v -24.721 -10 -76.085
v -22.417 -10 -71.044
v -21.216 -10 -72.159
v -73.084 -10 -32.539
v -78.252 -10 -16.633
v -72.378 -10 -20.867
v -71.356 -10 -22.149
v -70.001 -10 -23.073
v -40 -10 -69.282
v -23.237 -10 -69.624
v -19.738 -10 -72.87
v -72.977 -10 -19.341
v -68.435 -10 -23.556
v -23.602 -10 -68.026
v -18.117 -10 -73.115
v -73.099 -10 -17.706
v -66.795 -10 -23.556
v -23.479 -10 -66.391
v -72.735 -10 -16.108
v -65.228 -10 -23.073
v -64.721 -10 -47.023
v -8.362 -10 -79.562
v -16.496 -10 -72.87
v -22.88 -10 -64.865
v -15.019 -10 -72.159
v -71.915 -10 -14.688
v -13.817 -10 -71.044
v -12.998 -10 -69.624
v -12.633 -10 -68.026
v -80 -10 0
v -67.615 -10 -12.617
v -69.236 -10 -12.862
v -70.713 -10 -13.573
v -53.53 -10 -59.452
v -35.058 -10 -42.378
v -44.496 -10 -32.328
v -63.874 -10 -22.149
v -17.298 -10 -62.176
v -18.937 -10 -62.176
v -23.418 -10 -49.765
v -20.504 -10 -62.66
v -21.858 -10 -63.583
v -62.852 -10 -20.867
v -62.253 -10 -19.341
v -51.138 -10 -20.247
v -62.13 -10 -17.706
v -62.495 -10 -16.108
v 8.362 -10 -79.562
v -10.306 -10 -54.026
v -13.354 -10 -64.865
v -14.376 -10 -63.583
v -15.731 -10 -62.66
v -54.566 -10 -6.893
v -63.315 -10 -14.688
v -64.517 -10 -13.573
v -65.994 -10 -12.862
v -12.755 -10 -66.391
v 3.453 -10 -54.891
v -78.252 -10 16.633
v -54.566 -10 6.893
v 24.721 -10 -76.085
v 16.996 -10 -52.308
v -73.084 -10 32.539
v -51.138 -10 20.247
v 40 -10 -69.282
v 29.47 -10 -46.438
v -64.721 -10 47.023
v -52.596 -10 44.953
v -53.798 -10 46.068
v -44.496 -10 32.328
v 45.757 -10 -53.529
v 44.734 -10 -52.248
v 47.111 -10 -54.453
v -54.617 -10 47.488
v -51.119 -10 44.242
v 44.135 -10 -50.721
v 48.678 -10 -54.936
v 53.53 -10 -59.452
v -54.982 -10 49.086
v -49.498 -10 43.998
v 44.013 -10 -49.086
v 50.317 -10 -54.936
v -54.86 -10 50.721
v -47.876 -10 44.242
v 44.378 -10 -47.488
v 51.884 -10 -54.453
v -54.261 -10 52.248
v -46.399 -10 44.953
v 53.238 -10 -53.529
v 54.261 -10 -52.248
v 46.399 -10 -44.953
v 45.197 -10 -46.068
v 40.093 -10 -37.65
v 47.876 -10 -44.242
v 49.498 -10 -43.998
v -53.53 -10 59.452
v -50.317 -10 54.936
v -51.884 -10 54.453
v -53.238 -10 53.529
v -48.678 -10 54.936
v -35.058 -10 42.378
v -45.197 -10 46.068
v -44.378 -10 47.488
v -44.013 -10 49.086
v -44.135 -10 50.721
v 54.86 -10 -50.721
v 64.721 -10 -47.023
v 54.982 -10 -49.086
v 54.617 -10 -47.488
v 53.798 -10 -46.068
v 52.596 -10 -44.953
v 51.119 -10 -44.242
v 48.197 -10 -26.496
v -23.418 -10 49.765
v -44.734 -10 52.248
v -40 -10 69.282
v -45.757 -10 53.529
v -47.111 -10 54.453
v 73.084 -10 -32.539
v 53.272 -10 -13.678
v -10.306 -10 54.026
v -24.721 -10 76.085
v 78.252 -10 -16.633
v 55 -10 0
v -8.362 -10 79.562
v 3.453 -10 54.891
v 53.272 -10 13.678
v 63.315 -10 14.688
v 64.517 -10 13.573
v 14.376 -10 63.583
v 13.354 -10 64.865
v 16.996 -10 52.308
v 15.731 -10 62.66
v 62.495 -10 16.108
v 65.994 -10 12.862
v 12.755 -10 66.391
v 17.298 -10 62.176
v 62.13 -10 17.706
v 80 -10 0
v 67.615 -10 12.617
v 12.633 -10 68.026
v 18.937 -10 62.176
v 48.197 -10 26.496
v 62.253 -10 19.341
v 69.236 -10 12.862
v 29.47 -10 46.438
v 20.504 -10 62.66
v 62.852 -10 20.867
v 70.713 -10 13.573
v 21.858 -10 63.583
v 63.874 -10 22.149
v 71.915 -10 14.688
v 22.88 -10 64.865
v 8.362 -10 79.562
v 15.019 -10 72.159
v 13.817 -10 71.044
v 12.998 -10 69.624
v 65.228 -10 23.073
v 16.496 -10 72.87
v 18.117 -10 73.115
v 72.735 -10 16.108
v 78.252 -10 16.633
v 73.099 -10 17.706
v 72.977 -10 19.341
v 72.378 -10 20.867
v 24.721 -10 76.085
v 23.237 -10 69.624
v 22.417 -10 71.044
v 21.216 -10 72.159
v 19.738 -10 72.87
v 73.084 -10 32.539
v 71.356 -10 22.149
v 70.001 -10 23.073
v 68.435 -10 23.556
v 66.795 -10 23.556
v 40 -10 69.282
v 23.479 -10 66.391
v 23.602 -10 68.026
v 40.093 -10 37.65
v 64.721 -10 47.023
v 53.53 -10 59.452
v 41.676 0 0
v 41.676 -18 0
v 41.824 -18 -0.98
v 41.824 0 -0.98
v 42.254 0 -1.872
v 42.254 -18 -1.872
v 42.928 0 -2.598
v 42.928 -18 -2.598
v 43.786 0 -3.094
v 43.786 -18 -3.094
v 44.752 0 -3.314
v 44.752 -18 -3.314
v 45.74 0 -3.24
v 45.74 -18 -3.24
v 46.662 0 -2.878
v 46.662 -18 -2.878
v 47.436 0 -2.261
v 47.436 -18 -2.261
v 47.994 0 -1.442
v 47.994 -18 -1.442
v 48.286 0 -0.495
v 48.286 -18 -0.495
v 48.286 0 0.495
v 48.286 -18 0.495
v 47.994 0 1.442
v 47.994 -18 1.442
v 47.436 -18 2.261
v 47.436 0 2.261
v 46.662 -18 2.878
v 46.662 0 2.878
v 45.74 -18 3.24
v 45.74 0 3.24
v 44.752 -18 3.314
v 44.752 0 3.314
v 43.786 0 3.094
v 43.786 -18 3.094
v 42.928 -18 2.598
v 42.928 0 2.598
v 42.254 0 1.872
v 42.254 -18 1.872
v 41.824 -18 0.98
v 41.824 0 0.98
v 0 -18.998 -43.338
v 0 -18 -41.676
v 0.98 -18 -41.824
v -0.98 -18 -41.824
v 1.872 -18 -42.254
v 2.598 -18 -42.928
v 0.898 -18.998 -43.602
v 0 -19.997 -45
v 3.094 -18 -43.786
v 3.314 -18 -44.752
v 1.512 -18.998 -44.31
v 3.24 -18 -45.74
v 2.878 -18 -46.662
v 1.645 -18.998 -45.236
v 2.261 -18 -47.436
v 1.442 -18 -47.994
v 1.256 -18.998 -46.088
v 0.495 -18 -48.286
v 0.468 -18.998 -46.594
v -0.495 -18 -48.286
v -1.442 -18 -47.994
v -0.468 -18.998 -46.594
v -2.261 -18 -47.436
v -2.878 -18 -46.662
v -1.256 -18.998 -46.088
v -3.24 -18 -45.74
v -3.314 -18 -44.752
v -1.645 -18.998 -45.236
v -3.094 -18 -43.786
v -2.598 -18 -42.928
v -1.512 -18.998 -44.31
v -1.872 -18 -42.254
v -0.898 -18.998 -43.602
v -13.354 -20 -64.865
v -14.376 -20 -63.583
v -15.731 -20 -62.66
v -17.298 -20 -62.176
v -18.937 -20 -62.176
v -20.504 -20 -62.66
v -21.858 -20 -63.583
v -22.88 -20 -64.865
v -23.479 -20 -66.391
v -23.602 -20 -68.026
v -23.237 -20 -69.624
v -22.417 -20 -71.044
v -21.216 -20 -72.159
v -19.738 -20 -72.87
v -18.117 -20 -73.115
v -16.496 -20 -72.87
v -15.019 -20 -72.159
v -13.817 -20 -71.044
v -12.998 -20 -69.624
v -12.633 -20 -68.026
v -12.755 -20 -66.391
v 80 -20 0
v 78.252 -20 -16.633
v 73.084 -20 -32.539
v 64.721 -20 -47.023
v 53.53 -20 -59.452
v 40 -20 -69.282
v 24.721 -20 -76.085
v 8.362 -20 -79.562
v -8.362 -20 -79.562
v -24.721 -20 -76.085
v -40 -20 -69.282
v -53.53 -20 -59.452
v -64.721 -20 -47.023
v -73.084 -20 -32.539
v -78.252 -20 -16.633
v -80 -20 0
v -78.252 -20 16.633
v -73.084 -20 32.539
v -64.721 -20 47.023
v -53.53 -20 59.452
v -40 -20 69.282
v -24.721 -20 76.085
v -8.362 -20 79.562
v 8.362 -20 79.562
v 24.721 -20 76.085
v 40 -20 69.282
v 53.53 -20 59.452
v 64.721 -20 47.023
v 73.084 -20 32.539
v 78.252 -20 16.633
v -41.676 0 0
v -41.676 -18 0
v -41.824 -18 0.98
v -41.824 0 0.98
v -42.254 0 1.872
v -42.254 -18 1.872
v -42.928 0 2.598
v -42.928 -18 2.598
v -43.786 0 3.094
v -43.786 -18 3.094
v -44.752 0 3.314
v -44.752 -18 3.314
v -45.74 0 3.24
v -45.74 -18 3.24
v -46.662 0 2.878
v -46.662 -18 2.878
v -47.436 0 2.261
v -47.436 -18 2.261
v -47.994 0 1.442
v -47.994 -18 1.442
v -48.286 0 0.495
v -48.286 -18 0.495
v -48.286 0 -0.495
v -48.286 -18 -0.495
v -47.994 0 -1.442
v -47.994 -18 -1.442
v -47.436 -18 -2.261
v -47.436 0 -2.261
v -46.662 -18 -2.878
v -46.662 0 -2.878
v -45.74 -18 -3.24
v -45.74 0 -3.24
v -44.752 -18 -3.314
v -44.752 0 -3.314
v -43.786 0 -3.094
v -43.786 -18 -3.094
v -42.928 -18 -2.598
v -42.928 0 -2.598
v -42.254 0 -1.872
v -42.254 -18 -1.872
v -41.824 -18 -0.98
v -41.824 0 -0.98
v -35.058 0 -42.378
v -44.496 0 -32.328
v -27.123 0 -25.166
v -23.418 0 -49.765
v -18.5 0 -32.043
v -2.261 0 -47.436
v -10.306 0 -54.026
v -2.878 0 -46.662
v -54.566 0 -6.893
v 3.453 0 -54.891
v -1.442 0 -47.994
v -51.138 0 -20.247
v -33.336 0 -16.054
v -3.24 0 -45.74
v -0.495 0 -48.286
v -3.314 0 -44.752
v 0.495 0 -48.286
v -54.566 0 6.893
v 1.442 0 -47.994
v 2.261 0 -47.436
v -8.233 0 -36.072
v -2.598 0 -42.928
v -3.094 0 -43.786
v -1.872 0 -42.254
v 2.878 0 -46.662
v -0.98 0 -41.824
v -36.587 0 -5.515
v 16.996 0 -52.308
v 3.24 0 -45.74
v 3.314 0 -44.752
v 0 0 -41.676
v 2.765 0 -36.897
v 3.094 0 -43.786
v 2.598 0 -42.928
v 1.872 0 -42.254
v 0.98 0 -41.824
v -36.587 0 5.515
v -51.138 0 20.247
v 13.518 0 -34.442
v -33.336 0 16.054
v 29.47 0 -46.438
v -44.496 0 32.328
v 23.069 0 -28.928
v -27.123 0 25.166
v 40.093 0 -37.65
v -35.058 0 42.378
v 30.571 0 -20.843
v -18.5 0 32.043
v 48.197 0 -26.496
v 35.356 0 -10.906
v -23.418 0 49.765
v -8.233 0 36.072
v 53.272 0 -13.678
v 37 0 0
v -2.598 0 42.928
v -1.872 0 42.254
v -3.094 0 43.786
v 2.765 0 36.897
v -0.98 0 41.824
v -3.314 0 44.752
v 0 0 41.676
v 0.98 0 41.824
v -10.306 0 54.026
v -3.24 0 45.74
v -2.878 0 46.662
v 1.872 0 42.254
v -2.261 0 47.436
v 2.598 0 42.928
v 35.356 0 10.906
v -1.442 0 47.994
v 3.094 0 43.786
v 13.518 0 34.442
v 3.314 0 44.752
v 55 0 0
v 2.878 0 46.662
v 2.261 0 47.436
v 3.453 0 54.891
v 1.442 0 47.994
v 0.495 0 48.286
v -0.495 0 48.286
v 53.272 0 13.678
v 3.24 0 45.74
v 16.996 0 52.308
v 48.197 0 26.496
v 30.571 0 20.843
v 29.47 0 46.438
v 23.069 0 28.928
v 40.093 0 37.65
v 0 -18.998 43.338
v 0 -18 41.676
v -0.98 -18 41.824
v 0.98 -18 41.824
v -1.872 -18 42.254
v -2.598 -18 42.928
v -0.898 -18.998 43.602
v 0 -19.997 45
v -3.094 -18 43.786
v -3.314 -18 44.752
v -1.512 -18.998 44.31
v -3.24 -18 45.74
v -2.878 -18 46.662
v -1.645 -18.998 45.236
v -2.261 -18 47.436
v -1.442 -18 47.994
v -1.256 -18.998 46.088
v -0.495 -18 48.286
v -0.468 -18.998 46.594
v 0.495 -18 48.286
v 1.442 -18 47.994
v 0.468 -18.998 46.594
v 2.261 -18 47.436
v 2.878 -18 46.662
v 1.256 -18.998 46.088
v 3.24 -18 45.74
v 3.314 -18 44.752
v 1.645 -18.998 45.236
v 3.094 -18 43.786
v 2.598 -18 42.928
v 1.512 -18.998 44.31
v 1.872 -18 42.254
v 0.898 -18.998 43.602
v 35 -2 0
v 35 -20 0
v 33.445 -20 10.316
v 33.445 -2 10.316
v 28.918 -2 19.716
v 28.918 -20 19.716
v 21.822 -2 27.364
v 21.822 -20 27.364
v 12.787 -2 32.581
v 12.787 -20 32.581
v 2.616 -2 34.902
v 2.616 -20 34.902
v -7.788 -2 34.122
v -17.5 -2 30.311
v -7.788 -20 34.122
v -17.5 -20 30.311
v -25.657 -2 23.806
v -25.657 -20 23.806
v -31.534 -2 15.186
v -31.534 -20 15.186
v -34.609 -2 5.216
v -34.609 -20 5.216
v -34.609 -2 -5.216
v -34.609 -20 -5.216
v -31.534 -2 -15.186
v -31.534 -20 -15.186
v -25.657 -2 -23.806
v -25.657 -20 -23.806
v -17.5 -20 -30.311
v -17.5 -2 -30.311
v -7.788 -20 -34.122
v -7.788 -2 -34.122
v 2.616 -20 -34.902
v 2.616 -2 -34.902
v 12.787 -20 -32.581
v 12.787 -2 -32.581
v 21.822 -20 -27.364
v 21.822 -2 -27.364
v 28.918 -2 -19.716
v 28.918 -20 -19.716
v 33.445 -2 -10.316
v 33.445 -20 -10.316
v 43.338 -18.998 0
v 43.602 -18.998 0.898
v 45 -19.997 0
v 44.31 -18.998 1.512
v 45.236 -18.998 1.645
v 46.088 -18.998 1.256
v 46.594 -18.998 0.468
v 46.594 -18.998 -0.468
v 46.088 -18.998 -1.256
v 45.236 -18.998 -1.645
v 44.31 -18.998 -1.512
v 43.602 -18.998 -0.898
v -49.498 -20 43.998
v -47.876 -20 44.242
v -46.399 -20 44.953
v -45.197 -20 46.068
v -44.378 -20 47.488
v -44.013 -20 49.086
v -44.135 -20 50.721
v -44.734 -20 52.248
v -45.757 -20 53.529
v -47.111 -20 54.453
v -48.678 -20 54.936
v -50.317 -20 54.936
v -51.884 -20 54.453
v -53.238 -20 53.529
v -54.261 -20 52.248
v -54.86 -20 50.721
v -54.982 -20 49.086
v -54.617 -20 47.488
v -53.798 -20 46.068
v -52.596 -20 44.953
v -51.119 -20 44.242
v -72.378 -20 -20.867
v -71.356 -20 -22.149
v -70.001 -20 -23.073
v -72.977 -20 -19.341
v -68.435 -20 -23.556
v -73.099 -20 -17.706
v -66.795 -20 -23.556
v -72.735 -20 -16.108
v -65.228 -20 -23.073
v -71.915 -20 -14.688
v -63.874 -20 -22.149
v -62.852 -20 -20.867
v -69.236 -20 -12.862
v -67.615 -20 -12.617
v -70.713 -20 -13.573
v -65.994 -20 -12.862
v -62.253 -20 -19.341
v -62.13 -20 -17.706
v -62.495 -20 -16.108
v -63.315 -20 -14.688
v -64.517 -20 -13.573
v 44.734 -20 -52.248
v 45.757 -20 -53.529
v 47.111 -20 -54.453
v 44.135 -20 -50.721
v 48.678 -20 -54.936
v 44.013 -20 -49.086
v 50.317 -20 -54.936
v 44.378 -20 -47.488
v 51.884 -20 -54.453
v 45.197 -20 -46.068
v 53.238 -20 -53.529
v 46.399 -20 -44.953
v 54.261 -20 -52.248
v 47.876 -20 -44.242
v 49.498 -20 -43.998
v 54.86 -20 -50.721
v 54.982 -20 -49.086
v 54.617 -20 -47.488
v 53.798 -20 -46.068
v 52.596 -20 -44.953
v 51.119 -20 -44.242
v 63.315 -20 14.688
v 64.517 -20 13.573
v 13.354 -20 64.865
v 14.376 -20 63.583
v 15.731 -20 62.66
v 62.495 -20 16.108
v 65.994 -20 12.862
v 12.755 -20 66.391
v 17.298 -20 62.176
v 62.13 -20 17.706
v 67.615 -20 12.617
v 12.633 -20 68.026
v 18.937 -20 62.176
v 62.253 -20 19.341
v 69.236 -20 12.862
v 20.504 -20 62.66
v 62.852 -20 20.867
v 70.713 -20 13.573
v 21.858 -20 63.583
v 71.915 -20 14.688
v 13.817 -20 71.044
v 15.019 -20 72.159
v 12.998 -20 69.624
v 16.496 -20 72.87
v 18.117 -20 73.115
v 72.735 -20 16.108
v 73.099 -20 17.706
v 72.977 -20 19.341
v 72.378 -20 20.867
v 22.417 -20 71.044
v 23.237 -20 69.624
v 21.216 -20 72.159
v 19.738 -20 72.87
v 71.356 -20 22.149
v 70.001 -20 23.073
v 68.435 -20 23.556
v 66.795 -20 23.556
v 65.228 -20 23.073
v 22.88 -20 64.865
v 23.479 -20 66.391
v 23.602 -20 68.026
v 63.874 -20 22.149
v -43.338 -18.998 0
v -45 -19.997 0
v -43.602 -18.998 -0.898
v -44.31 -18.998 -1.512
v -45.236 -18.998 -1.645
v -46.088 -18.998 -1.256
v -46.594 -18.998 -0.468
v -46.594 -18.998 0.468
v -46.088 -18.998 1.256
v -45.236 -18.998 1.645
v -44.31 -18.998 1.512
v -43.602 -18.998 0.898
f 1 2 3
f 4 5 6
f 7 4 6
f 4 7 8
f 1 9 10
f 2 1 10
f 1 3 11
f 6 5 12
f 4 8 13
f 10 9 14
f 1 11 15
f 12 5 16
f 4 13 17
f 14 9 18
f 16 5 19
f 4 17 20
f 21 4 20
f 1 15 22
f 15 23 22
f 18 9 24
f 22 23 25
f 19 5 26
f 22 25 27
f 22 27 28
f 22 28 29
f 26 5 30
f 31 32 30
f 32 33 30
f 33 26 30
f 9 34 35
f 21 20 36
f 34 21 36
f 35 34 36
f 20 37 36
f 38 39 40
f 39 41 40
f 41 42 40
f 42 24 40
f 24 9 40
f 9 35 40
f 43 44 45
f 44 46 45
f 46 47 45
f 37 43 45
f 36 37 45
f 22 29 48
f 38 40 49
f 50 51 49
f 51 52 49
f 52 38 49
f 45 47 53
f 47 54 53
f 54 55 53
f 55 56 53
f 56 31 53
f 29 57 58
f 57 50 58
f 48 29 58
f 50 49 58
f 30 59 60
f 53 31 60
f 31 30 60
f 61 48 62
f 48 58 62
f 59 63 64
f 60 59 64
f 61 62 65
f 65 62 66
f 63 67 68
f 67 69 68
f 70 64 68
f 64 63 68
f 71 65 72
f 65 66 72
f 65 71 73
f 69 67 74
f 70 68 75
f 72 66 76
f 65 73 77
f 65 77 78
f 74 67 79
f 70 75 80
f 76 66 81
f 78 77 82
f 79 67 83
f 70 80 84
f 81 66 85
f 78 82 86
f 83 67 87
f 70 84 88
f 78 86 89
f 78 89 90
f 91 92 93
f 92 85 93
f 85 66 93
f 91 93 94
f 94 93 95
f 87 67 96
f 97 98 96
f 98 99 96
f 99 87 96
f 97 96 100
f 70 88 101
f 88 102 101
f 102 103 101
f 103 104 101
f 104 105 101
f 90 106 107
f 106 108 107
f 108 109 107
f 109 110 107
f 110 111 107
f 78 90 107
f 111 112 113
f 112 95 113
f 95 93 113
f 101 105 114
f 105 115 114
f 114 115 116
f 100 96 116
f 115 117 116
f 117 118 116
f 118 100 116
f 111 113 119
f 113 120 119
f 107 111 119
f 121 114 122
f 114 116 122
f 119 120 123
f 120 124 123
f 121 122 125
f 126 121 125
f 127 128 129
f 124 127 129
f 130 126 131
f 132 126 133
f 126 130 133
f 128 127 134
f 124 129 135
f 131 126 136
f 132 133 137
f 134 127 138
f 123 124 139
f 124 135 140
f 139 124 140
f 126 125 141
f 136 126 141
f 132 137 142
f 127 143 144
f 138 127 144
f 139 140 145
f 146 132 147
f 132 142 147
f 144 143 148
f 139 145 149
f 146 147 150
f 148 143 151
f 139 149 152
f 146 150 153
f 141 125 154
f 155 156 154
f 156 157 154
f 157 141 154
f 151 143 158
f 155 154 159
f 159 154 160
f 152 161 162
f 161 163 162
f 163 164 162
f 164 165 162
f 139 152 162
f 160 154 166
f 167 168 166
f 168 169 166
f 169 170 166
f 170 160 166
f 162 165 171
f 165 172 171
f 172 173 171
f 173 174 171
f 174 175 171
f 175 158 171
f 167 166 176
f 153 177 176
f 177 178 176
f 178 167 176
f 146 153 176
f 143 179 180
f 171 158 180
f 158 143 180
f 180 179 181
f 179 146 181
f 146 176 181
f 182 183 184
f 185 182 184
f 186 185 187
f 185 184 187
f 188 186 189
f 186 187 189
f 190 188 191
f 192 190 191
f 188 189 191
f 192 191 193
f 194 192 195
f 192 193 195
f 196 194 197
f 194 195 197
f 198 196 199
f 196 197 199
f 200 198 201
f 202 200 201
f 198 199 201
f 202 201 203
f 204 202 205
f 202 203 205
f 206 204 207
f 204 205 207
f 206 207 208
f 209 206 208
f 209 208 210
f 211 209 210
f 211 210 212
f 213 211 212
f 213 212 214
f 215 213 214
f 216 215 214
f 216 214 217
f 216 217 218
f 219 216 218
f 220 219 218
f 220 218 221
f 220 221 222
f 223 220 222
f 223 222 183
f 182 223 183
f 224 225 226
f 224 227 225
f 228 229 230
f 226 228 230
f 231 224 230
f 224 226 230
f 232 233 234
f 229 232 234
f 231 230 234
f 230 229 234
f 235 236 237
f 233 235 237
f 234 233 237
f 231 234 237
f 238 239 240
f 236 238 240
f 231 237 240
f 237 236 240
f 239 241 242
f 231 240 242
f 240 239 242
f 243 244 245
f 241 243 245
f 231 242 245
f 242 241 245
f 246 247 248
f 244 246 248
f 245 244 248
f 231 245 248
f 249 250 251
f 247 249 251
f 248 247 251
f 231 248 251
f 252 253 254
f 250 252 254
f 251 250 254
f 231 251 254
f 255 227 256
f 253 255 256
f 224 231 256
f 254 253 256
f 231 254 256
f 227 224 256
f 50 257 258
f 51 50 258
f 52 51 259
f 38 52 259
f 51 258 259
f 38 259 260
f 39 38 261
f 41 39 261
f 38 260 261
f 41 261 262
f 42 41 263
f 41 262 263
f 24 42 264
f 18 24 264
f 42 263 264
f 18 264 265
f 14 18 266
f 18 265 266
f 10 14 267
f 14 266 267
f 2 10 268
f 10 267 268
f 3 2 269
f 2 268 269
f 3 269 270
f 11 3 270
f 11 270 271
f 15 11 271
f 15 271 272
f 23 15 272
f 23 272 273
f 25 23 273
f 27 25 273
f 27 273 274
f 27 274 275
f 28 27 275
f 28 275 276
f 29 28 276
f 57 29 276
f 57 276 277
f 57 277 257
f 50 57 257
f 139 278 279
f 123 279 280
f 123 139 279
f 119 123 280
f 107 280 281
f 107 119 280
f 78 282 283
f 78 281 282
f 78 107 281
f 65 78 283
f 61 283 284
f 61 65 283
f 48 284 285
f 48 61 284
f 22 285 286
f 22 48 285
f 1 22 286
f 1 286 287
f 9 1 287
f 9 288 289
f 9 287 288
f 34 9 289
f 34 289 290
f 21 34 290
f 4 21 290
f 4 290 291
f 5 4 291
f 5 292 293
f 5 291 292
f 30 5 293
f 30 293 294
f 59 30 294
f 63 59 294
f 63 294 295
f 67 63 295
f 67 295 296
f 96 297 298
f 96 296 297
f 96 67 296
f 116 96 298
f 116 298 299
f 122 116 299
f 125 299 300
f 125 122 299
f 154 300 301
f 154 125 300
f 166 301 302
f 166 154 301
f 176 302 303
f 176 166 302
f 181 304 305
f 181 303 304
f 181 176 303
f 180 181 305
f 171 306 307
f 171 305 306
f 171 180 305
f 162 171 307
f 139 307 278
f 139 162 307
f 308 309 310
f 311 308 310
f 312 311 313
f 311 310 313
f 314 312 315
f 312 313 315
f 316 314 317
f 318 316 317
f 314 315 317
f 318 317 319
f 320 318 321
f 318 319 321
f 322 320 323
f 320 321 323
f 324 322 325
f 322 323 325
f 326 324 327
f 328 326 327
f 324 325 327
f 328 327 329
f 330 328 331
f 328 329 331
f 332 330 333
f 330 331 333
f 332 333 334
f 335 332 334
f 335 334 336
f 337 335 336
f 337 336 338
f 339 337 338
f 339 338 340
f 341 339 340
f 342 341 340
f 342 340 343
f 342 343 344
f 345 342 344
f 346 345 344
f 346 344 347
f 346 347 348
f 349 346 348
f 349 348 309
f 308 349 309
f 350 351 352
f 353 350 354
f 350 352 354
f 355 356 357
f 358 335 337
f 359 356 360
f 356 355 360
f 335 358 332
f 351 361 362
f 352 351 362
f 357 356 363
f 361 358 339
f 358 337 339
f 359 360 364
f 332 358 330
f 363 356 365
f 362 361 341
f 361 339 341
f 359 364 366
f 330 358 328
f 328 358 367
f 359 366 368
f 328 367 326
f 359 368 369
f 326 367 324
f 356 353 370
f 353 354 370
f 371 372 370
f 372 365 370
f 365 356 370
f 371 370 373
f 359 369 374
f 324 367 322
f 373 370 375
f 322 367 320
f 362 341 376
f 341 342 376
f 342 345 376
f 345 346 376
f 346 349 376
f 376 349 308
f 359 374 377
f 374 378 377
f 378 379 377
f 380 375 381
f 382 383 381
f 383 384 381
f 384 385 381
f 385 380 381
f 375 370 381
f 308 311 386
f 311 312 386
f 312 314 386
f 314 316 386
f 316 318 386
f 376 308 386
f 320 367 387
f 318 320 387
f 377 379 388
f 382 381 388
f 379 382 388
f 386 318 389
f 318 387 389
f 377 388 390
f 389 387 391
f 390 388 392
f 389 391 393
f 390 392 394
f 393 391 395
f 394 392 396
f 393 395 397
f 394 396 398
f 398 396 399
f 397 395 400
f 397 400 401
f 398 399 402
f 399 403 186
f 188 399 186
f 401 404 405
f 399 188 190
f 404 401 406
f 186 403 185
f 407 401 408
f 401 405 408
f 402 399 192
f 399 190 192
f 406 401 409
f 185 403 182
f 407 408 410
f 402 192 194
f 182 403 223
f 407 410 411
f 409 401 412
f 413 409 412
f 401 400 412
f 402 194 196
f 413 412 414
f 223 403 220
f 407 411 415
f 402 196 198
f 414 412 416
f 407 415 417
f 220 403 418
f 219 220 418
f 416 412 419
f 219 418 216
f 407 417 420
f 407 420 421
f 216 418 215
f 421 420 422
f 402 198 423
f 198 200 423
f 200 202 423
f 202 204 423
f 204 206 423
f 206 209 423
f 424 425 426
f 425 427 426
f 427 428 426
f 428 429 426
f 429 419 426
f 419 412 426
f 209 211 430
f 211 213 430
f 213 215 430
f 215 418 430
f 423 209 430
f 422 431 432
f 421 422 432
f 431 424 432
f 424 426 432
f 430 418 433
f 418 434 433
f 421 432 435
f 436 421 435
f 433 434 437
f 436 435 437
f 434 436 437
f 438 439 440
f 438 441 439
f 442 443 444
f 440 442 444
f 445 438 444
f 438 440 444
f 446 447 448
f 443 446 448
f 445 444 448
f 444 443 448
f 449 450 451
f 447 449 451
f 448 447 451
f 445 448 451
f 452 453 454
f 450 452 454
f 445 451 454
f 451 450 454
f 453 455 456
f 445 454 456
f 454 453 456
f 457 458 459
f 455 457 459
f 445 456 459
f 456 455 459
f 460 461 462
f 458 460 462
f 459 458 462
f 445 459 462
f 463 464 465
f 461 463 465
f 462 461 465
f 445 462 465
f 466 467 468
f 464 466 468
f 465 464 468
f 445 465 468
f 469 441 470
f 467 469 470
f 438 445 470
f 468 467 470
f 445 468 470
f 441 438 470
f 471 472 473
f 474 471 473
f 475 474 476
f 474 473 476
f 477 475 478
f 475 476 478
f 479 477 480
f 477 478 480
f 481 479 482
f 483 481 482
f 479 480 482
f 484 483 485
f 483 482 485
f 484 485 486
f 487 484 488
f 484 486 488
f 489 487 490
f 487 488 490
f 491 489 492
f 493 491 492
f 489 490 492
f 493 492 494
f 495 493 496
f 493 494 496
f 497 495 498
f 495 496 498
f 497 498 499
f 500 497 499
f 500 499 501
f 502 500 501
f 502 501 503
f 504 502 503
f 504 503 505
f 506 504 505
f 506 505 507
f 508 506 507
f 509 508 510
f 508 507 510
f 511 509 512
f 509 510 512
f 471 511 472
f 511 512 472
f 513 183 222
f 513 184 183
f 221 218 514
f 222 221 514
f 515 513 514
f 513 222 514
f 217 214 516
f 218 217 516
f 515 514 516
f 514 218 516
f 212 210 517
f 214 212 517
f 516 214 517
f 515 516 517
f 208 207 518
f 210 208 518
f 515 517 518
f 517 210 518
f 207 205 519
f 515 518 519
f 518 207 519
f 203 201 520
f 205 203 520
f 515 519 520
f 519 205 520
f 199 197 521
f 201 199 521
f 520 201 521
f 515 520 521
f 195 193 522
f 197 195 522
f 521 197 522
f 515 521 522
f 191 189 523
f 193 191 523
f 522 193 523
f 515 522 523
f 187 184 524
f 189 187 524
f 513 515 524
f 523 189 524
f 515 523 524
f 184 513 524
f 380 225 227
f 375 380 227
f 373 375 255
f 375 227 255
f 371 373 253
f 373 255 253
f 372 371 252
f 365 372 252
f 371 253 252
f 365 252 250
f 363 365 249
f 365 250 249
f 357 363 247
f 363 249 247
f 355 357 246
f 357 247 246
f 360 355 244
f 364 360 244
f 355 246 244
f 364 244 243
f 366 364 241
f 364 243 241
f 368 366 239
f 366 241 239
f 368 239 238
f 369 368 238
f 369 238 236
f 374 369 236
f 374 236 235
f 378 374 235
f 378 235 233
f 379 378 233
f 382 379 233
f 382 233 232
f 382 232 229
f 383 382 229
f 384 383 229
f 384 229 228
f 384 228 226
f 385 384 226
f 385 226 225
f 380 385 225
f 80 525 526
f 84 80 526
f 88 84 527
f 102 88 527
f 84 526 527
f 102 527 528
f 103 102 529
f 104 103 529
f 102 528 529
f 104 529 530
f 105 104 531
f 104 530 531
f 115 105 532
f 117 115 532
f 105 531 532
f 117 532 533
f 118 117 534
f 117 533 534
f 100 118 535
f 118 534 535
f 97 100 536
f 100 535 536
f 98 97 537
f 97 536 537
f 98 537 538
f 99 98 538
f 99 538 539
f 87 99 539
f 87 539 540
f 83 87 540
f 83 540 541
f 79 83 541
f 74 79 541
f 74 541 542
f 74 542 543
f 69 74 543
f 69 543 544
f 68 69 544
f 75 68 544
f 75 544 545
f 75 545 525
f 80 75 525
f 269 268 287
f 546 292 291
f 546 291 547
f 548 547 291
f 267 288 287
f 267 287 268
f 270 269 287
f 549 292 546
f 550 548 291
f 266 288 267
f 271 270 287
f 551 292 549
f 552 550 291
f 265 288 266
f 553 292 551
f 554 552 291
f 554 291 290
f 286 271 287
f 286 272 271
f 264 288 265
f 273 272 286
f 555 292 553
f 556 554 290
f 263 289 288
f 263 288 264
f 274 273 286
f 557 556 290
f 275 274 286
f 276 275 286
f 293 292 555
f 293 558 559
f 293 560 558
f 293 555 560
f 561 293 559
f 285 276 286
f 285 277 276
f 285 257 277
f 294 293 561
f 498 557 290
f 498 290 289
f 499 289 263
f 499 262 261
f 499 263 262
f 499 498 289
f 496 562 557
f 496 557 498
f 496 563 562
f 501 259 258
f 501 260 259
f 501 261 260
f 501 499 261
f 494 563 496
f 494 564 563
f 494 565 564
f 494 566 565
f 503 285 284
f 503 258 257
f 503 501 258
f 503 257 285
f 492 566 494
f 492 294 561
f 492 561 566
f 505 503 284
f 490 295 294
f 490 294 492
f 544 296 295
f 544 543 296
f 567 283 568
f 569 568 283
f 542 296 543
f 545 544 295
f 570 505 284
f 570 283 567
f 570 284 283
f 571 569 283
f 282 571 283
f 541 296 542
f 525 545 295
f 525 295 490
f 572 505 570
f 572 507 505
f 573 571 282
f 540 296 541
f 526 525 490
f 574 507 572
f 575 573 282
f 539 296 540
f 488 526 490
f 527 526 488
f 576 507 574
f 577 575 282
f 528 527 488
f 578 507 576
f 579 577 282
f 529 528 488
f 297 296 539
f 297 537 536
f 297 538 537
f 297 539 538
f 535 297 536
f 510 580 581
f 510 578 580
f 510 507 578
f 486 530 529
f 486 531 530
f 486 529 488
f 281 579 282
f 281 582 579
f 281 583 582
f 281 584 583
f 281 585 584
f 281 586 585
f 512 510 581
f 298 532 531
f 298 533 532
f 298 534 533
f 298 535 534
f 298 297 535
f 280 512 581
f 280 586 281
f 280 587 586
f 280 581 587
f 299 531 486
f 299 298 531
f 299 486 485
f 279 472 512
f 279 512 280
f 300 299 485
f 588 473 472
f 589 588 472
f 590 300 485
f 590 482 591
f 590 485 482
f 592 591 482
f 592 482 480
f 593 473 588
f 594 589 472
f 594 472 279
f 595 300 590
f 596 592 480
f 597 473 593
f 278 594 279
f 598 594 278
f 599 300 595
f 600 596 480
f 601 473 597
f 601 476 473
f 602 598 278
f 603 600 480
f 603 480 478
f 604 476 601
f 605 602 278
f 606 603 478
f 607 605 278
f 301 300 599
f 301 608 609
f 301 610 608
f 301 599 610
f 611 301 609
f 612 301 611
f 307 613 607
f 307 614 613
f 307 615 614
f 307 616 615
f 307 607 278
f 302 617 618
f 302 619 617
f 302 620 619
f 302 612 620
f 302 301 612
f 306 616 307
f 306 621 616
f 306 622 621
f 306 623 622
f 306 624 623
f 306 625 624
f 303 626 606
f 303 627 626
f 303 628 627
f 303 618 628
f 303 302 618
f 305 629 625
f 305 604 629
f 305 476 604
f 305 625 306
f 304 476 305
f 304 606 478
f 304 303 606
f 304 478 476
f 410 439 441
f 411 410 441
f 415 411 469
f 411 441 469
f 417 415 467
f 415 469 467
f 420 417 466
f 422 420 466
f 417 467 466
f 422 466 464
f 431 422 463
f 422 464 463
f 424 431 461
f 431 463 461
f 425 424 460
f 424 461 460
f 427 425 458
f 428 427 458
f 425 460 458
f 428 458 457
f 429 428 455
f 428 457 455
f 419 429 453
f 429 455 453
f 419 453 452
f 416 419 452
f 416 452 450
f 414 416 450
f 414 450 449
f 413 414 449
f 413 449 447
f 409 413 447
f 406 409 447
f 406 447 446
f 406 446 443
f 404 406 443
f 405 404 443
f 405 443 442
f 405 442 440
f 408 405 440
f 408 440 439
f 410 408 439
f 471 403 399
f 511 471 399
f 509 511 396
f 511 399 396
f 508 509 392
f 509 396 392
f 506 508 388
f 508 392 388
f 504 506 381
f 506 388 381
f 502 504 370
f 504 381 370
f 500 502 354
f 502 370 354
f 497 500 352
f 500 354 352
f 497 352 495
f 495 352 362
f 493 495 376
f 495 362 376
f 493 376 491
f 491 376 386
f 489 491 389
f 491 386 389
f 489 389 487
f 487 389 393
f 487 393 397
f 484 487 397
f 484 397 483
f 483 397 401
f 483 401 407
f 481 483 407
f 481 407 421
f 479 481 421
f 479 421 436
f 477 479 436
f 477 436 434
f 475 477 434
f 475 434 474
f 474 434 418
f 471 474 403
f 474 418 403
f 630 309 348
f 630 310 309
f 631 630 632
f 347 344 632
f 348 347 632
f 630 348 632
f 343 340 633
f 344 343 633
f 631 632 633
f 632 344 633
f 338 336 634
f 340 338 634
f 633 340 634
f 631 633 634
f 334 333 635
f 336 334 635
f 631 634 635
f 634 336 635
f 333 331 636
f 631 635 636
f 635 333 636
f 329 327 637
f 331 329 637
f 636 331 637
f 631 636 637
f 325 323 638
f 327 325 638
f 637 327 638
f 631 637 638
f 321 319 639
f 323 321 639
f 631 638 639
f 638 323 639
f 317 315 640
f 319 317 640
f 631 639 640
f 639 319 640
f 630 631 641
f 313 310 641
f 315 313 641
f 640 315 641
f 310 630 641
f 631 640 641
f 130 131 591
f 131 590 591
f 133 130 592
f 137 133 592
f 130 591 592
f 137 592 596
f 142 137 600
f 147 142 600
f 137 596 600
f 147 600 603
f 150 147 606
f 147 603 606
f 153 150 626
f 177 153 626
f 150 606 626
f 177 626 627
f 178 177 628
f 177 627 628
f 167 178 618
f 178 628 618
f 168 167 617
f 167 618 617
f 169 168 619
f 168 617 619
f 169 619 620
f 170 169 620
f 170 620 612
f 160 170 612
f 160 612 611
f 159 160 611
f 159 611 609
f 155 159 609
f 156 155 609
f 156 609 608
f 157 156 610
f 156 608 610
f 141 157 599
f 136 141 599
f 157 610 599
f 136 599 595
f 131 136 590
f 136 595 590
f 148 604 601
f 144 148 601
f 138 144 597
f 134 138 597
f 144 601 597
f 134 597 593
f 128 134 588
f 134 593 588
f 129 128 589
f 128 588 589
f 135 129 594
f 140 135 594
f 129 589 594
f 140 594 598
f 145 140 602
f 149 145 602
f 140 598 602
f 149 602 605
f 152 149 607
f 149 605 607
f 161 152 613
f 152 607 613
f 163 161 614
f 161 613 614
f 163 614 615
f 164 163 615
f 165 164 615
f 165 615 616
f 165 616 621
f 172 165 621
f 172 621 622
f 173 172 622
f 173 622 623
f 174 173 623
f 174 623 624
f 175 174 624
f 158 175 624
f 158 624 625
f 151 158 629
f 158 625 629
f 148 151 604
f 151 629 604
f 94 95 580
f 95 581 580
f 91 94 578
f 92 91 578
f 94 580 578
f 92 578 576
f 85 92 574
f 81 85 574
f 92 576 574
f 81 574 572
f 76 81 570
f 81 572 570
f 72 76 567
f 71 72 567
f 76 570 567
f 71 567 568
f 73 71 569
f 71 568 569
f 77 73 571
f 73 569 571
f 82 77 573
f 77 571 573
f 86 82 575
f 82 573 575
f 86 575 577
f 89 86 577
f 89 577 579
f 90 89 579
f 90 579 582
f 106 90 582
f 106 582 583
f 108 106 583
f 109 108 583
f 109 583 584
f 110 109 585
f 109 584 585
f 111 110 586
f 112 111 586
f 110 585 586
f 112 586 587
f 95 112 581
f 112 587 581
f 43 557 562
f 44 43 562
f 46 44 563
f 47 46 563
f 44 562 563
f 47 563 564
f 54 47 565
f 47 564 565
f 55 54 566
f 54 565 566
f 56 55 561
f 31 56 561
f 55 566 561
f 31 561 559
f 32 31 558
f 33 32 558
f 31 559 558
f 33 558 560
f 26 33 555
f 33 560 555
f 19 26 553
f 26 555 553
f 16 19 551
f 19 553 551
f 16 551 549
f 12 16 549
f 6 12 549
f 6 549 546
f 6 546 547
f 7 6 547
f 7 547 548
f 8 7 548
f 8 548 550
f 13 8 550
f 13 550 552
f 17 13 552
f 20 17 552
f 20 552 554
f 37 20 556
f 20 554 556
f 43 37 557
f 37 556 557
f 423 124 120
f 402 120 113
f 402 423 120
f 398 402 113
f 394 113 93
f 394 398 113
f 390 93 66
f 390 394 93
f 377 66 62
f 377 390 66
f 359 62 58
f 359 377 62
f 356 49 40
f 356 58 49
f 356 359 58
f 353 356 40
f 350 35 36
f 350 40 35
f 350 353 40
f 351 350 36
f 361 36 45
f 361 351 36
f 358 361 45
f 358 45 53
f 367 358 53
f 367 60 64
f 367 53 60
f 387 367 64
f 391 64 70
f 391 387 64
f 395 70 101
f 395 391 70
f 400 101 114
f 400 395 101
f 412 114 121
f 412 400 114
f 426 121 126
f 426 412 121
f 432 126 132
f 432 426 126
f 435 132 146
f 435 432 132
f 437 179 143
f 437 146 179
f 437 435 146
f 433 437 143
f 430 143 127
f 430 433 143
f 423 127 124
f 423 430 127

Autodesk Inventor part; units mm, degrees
ref_plane "YZ Plane" through (0, 0, 0) normal (1, 0, 0) x (0, 1, 0)
ref_plane "XZ Plane" through (0, 0, 0) normal (0, 1, 0) x (-1, 0, 0)
ref_plane "XY Plane" through (0, 0, 0) normal (0, 0, 1) x (1, 0, 0)
sketch "Эскиз1" plane through (0, 0, 0) normal (0, 0, 1) x (1, 0, 0)
  line L0 (0, 0) -> (0, -30.9602)
  line L1 (35, 0) -> (35, -20)
  line L2 (35, -20) -> (80, -20)
  line L3 (80, -20) -> (80, -10)
  line L4 (80, -10) -> (55, -10)
  line L5 (55, -10) -> (55, 0)
  line L6 (55, 0) -> (35, 0)
  dimension "d0" = 70
  dimension "d1" = 110
  dimension "diam_out_plate" = 160
  dimension "d3" = 20
  dimension "d4" = 10
revolve "Вращение1" add sketch "Эскиз1" angle 360 about axis through (0, 0, 0) along (0, -1, 0)
sketch "Эскиз2" plane through (0, 0, 0) normal (0, 1, 0) x (1, 0, 0)
  circle A0 centre (0, 0) radius 35 projected
  circle A1 centre (0, 0) radius 55 projected
  point P0 (0, 45)
  dimension "d6" = 45
hole "Отверстие1" at (0, 0, -45) direction (0, -1, 0) diameter 6.647 depth 18 tip angle 118 thread size "M8x1.25" class "6H" standard "ISO Metric profile"
pattern_circular "Круговой массив1" count 4 over 360 about axis through (0, -10, 0) along (0, -1, 0) of "Отверстие1"
sketch "Эскиз3" plane through (0, -10, 0) normal (0, 1, 0) x (1, 0, 0)
  circle A0 centre (0, 0) radius 55 projected
  circle A1 centre (0, 0) radius 80 projected
  circle A2 centre (0, 0) radius 80 projected
  line L0 (0, 80) -> (0, 0)
  line L1 (0, 0) -> (49.4975, 49.4975) construction
  dimension "d17" = 70
  dimension "d18" = 45
hole "Отверстие2" at (49.4975, -10, -49.4975) direction (0, -1, 0) diameter 11 end through all
pattern_circular "Круговой массив2" count 6 over 360 about axis through (0, -10, 0) along (0, -1, 0) of "Отверстие2"
chamfer "Фаска2" distance 2 angle 45 1 edges at (-35, 0, 0)
properties part number "плашка"
